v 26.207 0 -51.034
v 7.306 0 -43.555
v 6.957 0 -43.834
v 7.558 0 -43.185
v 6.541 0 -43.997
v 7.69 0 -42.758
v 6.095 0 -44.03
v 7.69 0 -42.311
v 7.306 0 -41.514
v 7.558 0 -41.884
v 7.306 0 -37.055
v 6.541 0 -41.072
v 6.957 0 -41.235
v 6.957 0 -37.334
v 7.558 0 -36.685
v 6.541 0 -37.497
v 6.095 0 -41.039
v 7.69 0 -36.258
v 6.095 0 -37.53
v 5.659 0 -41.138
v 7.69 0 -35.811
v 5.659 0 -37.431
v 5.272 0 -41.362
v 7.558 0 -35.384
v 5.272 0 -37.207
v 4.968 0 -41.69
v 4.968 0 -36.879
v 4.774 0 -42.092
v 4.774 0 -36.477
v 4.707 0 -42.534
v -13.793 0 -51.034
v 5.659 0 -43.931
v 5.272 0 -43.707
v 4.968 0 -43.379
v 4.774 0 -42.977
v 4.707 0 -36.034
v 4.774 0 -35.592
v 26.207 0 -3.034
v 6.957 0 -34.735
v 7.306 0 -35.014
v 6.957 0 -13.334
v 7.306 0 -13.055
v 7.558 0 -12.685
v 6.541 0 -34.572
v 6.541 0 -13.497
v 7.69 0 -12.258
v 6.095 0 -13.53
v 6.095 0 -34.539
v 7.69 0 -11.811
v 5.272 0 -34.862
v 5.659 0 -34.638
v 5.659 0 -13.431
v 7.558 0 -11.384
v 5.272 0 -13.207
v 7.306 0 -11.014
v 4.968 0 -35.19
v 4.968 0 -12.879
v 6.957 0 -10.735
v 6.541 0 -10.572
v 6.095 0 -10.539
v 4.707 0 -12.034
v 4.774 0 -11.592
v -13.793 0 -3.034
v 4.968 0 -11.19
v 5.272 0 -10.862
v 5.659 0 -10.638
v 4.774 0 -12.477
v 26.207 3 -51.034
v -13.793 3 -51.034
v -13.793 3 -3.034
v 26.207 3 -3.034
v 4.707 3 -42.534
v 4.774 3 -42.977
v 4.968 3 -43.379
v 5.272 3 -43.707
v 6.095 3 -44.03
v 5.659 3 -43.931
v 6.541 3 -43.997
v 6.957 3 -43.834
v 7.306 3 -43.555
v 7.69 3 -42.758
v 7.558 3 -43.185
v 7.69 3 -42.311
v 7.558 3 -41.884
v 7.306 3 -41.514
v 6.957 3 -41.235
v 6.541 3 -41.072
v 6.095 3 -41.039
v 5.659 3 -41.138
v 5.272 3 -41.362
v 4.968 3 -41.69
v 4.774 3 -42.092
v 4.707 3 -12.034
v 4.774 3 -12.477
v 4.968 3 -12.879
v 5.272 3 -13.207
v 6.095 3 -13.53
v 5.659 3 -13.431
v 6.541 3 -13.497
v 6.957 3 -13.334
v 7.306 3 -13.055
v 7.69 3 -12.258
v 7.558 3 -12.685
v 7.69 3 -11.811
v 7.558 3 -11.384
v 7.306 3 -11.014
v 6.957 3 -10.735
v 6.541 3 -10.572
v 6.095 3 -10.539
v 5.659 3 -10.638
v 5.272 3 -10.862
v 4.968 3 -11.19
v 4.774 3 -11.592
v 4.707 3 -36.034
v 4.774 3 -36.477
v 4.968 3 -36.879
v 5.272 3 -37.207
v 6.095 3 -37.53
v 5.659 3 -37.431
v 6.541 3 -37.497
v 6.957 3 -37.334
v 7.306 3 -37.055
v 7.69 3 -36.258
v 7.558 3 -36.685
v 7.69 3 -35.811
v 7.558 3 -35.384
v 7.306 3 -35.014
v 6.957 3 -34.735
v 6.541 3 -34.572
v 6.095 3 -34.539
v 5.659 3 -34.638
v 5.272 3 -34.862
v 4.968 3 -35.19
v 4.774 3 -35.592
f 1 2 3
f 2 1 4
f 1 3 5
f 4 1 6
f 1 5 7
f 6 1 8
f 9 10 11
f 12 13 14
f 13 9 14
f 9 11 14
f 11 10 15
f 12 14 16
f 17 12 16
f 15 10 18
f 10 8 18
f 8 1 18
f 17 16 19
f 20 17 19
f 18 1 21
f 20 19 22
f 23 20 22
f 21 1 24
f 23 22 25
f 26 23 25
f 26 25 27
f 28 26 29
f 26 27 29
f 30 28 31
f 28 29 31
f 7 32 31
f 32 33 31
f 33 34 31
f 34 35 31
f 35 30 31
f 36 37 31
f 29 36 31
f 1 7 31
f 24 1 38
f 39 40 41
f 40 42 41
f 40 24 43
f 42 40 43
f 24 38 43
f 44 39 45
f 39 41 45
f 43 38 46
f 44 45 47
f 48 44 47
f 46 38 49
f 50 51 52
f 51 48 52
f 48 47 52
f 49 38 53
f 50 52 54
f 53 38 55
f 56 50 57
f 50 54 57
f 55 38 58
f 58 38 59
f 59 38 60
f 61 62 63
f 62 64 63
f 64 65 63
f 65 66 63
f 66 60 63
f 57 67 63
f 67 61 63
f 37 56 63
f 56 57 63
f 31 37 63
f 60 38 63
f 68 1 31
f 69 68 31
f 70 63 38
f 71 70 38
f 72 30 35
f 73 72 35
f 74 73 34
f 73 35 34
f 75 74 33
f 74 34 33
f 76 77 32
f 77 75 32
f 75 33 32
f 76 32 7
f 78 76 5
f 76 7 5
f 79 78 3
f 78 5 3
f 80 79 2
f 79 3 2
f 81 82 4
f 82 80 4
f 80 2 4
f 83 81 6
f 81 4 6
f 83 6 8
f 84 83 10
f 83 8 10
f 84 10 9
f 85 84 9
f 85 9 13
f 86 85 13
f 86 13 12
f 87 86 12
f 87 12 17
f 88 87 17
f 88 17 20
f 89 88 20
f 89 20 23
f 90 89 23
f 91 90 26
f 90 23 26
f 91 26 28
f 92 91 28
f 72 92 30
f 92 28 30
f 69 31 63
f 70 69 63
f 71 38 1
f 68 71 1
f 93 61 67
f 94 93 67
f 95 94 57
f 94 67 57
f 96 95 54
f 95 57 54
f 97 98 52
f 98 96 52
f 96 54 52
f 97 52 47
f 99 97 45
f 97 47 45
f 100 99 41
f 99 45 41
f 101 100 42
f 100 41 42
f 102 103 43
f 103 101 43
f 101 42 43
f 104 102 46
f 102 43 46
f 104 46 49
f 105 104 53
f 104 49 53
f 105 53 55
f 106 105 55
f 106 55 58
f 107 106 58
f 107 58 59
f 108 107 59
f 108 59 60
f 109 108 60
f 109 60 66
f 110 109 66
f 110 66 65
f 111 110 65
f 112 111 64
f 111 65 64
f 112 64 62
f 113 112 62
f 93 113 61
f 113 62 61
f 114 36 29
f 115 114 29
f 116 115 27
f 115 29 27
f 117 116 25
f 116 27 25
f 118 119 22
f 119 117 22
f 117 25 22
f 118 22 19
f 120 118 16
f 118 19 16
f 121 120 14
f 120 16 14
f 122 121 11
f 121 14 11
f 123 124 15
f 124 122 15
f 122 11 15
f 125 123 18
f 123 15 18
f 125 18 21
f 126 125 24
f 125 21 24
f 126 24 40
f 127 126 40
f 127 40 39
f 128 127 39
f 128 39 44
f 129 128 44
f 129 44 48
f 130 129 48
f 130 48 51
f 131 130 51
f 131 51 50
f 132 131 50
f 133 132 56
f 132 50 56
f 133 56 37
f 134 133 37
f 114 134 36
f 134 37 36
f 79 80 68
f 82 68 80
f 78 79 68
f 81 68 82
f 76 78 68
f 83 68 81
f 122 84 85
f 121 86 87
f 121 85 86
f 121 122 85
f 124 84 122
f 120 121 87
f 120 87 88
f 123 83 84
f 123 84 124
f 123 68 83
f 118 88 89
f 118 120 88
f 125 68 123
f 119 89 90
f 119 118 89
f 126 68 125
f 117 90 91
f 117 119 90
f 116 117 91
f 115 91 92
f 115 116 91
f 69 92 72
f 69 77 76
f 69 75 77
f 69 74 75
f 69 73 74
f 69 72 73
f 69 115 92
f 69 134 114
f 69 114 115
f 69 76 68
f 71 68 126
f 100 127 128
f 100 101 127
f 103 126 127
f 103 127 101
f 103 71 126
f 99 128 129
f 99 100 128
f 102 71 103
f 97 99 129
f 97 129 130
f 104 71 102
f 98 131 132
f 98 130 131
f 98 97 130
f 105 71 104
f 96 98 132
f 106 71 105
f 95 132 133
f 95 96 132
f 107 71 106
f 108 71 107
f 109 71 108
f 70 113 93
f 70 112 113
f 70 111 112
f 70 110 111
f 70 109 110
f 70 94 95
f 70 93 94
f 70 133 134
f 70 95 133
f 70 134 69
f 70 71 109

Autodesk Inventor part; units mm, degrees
ref_plane "YZ Plane" through (0, 0, 0) normal (1, 0, 0) x (0, 1, 0)
ref_plane "XZ Plane" through (0, 0, 0) normal (0, 1, 0) x (-1, 0, 0)
ref_plane "XY Plane" through (0, 0, 0) normal (0, 0, 1) x (1, 0, 0)
sketch "Sketch1" plane through (0, 0, 0) normal (0, 1, 0) x (-1, 0, 0)
  line L0 (13.7931, -3.0345) -> (-26.2069, -3.0345)
  line L1 (-26.2069, -3.0345) -> (-26.2069, -51.0345)
  line L2 (-26.2069, -51.0345) -> (13.7931, -51.0345)
  line L3 (13.7931, -51.0345) -> (13.7931, -3.0345)
  circle A0 centre (-6.2069, -12.0345) radius 1.5
  circle A1 centre (-6.2069, -42.5345) radius 1.5
  circle A2 centre (-6.2069, -36.0345) radius 1.5
  point P0 (0, 0)
  dimension "d0" = 48
  dimension "d1" = 40
  dimension "d2" = 3
  dimension "d4" = 20
  dimension "d7" = 8.5
  dimension "d8" = 15
  dimension "d9" = 3
  dimension "d10" = 3
  dimension "d11" = 20
  dimension "d12" = 20
  dimension "d13" = 9
extrude "Extrusion1" add sketch "Sketch1" along normal blind 3
equation "\"d5\" = d9"
properties part number "support-lanceur"
